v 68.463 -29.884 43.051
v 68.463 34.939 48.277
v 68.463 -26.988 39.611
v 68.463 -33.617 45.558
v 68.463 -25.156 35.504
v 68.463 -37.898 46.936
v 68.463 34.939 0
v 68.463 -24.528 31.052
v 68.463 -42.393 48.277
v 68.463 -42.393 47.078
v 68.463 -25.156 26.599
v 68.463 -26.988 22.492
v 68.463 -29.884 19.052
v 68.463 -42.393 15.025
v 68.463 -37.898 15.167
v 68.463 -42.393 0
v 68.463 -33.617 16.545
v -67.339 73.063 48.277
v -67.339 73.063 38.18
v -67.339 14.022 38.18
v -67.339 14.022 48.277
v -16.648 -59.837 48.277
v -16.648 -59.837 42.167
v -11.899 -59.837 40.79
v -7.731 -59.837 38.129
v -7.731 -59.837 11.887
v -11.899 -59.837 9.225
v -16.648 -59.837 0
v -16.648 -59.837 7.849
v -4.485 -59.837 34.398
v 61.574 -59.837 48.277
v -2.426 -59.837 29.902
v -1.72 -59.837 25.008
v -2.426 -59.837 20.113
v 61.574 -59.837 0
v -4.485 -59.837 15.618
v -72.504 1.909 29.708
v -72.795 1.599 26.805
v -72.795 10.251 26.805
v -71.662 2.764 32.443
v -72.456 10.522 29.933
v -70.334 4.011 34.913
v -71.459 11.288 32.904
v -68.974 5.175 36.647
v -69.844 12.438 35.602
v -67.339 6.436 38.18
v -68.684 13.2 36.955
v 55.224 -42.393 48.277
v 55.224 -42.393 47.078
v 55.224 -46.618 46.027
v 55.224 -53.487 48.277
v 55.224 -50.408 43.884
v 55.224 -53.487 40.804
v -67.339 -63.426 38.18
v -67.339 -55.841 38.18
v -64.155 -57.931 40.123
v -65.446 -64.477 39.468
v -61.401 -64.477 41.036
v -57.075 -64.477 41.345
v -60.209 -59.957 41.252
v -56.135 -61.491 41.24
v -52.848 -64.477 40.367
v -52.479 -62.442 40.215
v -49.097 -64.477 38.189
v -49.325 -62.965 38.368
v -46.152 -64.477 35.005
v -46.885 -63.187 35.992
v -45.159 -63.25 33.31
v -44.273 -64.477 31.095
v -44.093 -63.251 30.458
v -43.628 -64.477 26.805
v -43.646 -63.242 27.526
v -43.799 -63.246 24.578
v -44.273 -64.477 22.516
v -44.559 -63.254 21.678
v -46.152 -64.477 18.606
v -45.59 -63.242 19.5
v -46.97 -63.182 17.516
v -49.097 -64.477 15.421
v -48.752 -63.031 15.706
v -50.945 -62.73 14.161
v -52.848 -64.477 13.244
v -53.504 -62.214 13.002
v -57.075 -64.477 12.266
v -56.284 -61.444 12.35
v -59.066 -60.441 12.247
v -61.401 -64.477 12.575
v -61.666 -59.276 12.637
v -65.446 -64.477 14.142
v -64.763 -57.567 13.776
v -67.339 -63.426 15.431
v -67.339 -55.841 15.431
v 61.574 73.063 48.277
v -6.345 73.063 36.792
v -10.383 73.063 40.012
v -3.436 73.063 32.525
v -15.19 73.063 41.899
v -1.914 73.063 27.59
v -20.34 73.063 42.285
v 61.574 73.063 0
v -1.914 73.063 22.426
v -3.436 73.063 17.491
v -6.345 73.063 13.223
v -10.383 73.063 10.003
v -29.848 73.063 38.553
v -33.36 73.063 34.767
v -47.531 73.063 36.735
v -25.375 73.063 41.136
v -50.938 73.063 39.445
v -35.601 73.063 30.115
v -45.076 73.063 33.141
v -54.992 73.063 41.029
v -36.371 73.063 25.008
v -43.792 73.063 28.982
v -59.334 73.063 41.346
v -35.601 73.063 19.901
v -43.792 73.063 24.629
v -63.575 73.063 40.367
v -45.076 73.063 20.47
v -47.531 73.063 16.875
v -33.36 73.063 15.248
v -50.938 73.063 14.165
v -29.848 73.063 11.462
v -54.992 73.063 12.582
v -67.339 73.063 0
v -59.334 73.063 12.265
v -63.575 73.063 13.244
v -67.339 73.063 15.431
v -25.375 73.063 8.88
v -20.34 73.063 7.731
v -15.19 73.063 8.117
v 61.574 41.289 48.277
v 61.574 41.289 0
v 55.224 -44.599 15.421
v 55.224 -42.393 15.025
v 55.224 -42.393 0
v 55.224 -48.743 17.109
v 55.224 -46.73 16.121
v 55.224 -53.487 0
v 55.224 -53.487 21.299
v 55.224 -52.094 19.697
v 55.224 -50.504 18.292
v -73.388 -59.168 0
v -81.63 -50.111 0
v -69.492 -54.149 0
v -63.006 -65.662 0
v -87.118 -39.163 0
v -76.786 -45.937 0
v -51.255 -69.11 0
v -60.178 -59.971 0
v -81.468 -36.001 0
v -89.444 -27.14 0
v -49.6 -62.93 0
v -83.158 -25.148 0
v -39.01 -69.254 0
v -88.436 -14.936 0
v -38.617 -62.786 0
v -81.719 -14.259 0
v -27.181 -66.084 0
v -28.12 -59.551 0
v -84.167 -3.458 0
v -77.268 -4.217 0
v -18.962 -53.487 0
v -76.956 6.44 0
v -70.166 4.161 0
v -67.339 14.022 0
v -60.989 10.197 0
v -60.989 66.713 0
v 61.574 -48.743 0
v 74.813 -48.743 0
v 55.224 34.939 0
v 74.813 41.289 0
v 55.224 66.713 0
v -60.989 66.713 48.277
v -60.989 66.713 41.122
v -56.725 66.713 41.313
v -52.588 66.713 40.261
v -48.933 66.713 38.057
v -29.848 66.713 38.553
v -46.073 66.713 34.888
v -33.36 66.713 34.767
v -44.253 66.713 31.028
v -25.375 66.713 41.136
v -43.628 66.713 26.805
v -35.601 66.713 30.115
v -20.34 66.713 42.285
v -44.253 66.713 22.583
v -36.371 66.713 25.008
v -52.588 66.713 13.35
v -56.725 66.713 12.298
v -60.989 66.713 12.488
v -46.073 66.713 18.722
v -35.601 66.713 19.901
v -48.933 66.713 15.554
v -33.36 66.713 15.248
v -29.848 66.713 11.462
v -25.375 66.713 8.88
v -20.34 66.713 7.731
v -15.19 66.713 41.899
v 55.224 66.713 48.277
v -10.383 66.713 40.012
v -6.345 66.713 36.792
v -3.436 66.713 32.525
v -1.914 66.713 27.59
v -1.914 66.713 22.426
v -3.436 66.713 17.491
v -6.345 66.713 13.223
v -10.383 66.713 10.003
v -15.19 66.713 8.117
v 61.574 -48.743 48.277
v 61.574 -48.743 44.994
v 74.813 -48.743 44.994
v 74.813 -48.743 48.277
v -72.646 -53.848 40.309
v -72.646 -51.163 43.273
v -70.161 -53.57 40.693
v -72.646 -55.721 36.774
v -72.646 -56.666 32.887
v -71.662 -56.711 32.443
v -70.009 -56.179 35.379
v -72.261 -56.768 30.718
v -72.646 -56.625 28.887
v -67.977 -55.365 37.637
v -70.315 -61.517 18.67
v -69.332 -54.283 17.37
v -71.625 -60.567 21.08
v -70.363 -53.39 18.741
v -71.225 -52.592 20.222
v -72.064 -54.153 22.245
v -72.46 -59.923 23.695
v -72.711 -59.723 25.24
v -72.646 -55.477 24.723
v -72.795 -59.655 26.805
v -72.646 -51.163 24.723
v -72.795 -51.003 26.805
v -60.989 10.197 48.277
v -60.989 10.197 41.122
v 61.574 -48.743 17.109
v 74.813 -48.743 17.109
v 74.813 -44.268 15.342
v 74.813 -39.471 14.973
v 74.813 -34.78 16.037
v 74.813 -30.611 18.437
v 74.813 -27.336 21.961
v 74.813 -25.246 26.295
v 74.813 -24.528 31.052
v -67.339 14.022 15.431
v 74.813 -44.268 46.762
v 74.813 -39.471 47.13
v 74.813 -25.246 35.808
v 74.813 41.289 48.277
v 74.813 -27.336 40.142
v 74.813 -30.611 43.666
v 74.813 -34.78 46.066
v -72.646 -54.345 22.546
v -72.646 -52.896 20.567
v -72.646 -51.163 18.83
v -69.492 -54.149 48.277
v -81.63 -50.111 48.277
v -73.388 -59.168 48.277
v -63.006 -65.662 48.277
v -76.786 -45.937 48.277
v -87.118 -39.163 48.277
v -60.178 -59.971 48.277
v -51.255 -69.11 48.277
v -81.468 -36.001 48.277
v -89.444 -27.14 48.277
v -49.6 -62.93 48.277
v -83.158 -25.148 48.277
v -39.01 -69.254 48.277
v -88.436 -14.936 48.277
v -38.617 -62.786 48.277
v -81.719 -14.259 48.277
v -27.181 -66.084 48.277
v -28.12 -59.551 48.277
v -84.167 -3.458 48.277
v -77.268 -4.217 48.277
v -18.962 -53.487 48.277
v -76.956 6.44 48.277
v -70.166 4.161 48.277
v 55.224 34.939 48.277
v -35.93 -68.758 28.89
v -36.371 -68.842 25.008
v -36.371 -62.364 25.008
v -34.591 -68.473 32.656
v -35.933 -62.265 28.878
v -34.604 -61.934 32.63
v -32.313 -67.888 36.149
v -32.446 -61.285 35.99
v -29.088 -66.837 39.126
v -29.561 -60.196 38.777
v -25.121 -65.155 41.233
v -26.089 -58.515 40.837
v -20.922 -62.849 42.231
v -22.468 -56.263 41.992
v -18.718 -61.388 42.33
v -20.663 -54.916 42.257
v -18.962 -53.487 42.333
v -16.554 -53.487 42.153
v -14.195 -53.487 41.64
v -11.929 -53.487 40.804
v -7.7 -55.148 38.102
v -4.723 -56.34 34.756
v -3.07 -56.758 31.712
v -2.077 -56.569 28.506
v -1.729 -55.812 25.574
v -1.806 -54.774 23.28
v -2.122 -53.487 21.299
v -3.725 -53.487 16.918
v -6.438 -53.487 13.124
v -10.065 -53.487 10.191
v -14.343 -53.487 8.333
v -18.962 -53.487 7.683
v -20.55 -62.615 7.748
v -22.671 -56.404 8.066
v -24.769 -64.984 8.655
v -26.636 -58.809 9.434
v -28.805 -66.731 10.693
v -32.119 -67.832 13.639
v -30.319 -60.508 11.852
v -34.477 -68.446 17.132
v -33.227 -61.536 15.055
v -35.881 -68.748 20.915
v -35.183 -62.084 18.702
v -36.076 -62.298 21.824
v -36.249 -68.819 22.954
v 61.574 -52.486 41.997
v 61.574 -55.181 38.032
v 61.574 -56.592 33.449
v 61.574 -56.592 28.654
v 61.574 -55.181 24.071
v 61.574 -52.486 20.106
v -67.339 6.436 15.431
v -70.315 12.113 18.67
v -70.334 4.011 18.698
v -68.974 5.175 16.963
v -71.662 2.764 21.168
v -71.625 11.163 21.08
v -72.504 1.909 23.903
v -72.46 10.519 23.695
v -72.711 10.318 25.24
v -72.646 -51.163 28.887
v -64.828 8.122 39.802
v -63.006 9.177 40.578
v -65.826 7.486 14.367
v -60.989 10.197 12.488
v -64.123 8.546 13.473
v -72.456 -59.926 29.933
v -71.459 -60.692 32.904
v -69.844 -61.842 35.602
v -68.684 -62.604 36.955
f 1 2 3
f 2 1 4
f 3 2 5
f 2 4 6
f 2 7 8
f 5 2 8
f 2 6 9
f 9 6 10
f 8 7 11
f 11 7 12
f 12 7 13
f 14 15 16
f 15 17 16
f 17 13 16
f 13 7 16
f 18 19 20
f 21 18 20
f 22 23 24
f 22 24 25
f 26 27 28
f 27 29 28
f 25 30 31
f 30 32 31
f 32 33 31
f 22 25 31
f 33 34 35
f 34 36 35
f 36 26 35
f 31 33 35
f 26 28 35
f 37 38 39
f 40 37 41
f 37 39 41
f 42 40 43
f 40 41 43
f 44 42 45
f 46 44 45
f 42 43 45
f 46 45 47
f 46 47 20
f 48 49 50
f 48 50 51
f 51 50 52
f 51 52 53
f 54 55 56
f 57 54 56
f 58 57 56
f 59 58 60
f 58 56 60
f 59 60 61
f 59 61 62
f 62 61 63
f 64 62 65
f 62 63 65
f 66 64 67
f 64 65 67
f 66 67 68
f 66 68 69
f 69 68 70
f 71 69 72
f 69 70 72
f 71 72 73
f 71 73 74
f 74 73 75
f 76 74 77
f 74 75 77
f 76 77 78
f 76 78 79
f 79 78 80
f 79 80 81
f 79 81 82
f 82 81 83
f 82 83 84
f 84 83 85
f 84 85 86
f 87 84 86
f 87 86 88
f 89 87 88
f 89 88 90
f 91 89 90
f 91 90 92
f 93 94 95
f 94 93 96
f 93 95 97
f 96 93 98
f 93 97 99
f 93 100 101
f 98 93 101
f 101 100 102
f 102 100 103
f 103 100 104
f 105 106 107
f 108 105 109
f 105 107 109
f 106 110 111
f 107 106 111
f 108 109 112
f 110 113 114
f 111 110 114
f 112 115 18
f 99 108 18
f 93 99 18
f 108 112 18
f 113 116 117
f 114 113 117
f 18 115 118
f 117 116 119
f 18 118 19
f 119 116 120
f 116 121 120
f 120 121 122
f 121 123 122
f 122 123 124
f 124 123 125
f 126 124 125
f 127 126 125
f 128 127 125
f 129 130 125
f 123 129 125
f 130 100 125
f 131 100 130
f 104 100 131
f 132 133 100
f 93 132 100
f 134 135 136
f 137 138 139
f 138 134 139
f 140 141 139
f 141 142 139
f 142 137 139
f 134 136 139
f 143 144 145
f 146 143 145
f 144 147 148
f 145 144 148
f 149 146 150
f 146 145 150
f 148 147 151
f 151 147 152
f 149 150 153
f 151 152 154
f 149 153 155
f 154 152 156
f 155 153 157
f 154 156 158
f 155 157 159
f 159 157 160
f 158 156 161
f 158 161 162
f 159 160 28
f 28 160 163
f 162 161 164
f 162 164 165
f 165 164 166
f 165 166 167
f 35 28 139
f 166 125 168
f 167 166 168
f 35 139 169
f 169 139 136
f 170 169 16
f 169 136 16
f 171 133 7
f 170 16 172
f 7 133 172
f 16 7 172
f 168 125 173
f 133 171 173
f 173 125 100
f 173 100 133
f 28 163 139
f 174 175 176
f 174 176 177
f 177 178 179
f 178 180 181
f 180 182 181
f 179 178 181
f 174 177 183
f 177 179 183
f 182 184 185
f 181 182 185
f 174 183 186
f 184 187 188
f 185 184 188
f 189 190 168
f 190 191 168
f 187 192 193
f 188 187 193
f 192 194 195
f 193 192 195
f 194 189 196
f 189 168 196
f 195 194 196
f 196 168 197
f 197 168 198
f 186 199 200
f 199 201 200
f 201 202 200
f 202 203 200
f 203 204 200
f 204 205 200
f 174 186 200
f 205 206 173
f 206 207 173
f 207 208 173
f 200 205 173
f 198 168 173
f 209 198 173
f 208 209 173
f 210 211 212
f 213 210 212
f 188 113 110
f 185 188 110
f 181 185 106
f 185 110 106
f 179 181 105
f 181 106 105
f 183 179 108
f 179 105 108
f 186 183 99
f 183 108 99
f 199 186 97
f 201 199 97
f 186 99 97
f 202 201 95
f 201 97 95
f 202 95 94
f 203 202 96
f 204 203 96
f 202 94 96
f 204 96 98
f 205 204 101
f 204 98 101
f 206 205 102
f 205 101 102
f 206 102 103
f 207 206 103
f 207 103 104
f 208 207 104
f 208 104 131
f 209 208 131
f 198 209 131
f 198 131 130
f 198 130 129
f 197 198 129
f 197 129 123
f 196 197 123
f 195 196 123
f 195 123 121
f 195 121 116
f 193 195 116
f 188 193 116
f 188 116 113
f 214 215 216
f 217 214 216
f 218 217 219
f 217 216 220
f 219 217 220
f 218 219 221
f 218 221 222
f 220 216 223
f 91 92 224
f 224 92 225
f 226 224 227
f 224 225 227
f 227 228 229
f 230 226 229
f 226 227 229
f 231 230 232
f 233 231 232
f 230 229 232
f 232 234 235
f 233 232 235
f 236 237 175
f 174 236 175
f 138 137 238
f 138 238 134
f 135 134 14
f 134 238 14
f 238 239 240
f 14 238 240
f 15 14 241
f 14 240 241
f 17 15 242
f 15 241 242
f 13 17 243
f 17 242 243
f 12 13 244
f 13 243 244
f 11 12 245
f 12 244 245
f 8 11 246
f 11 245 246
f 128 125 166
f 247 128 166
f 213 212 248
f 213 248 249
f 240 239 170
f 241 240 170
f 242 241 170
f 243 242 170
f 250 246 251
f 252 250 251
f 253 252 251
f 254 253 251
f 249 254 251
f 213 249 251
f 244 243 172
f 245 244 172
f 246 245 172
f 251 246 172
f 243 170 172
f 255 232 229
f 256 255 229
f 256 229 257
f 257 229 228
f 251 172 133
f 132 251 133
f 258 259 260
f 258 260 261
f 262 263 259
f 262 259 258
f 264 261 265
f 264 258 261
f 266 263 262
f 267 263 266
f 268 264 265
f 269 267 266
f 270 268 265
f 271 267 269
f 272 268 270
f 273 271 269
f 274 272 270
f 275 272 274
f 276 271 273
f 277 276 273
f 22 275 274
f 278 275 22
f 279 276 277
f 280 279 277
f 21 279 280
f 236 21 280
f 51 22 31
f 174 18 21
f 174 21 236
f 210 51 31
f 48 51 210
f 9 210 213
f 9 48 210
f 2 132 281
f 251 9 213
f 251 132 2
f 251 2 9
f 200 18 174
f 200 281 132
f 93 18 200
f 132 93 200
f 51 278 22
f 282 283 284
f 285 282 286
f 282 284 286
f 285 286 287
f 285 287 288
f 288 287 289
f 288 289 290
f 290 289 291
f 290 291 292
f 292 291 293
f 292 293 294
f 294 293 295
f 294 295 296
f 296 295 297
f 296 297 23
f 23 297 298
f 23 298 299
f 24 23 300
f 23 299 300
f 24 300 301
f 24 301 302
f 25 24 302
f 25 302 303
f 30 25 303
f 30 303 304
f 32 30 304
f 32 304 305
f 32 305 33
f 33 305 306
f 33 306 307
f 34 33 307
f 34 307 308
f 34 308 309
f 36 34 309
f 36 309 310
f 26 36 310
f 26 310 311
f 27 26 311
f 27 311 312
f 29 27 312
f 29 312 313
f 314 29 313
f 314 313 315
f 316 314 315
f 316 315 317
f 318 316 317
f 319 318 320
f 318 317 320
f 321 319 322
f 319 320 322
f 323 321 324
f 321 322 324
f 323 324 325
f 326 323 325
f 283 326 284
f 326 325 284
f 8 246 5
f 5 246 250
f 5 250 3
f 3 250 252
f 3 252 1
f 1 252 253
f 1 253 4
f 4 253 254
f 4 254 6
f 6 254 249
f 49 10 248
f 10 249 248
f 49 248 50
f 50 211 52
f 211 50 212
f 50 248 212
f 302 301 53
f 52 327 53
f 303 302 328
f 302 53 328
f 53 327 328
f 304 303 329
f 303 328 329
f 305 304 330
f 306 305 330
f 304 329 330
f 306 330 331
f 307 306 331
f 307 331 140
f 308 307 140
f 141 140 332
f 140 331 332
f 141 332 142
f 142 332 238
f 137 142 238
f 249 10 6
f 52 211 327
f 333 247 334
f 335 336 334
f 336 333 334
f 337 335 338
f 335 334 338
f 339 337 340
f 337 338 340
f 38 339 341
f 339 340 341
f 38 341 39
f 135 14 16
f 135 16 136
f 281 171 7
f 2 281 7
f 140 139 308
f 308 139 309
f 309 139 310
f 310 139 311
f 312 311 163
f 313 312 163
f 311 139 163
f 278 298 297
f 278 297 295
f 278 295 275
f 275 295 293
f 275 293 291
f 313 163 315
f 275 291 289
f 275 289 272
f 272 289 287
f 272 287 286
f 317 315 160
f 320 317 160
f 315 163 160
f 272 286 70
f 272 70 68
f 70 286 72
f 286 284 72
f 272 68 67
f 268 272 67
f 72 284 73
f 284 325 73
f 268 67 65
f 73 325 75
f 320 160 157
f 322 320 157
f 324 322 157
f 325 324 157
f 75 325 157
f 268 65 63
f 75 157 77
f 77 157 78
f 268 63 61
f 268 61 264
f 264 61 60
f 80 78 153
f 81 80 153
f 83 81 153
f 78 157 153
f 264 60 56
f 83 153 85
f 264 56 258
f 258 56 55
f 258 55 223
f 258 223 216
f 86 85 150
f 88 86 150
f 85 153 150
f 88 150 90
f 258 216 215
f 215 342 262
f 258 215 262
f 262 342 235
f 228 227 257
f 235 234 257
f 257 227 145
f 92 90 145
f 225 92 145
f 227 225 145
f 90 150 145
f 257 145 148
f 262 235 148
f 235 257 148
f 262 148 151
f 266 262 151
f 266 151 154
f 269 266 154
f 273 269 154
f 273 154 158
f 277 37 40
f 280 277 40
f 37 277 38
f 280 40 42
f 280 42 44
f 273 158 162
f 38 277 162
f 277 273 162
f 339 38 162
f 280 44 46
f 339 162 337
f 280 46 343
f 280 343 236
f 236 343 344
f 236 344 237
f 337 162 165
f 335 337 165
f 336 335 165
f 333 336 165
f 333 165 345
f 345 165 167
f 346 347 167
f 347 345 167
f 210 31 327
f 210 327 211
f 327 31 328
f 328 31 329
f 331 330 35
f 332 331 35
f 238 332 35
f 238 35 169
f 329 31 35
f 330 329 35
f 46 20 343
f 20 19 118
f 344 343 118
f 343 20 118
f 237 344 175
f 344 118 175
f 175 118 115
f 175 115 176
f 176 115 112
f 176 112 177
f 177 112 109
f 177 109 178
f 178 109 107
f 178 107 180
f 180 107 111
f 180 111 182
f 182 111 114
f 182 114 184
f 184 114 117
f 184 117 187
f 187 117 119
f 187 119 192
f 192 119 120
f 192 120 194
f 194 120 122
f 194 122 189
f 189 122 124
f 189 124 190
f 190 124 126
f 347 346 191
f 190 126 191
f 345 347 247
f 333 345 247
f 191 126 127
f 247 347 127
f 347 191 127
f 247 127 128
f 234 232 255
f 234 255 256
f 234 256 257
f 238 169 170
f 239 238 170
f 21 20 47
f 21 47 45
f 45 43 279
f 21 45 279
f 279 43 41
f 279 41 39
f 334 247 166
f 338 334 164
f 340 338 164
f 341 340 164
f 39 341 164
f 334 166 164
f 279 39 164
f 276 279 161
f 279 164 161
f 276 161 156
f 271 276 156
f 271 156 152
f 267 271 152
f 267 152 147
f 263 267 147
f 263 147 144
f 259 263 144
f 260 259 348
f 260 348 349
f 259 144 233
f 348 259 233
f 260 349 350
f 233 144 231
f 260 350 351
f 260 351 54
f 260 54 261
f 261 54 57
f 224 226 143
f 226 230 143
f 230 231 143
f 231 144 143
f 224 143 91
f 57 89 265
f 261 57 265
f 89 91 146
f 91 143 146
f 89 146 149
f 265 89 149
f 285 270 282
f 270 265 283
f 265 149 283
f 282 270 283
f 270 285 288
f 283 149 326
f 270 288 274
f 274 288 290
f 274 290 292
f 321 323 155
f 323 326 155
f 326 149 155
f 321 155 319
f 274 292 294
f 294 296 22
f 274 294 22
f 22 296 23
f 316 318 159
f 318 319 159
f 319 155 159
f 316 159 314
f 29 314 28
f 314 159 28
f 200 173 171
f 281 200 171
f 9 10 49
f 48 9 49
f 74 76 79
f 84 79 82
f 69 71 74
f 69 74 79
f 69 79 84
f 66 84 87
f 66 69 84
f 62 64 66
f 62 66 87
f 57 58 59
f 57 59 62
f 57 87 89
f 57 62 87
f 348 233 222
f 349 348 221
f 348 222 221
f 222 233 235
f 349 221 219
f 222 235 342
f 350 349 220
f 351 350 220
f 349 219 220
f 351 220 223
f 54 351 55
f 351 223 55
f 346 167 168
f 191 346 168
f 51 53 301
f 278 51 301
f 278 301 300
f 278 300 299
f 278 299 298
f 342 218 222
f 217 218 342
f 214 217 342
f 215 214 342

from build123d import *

# Parameters (mm, degrees)
F1_DEPTH = 48.2772234827
F2_R     = 17.3254122278
F3_DEPTH = 178.0532356352
F6_DEPTH = 147.4594417959
F8_DEPTH = 137.5391036272


with BuildPart() as f1:
    # F0 (on Top) → F1 (new body)
    with BuildSketch(Plane.XY):
        with BuildLine():
            Line((61.5742132068, 73.062568903), (-67.3387721181, 73.062568903))
            Line((-67.3387721181, 73.062568903), (-67.3387721181, 14.0218225376))
            ThreePointArc((-67.3387721181, 14.0218225376), (-81.6301408592, -50.1107967732), (-16.6482494662, -59.8365291953))
            Line((-16.6482494662, -59.8365291953), (61.5742132068, -59.8365291953))
            Line((61.5742132068, -59.8365291953), (61.5742132068, -48.7425401807))
            Line((61.5742132068, -48.7425401807), (74.8133137822, -48.7425401807))
            Line((74.8133137822, -48.7425401807), (74.8133137822, 41.2890613079))
            Line((74.8133137822, 41.2890613079), (61.5742132068, 41.2890613079))
            Line((61.5742132068, 41.2890613079), (61.5742132068, 73.062568903))
        make_face()
        with BuildLine():
            Line((-60.9887721181, 66.712568903), (55.2242132068, 66.712568903))
            Line((55.2242132068, 66.712568903), (55.2242132068, 34.9390613079))
            Line((55.2242132068, 34.9390613079), (68.4633137822, 34.9390613079))
            Line((68.4633137822, 34.9390613079), (68.4633137822, -42.3925401807))
            Line((68.4633137822, -42.3925401807), (55.2242132068, -42.3925401807))
            Line((55.2242132068, -42.3925401807), (55.2242132068, -53.4865291953))
            Line((55.2242132068, -53.4865291953), (-18.9623394024, -53.4865291953))
            ThreePointArc((-18.9623394024, -53.4865291953), (-76.785621878, -45.9365465001), (-60.9887721181, 10.1971668335))
            Line((-60.9887721181, 10.1971668335), (-60.9887721181, 66.712568903))
        make_face(mode=Mode.SUBTRACT)
    extrude(amount=F1_DEPTH)

    # F2 (on face) → F3 (cut)
    with BuildSketch(Plane(origin=(0, 73.062568903, 0), x_dir=(-1, 0, 0), z_dir=(0, 1, 0))):
        with Locations((19.0455075353, 25.0077471137)):
            Circle(F2_R)
    extrude(amount=-F3_DEPTH, mode=Mode.SUBTRACT)

    # F5 (on face) → F6 (cut)
    with BuildSketch(Plane.YZ.offset(74.8133137822)):
        with BuildLine():
            Line((-48.7425401807, 17.1086588609), (-48.7425401807, 44.9944263589))
            ThreePointArc((-48.7425401807, 44.9944263589), (-56.7710567622, 31.0515426099), (-48.7425401807, 17.1086588609))
        make_face()
        with BuildLine():
            ThreePointArc((-48.7425401807, 17.1086588609), (-32.6051243829, 17.0807615663), (-24.5283525081, 31.0515426099))
            ThreePointArc((-24.5283525081, 31.0515426099), (-32.6051243829, 45.0223236536), (-48.7425401807, 44.9944263589))
            Line((-48.7425401807, 44.9944263589), (-48.7425401807, 17.1086588609))
        make_face()
    extrude(amount=-F6_DEPTH, mode=Mode.SUBTRACT)

    # F7 (on face) → F8 (cut)
    with BuildSketch(Plane(origin=(0, 73.062568903, 0), x_dir=(-1, 0, 0), z_dir=(0, 1, 0))):
        with BuildLine():
            ThreePointArc((67.3387721181, 15.4306932509), (71.3607365337, 20.4974204611), (72.7954935712, 26.8053039908))
            ThreePointArc((72.7954935712, 26.8053039908), (71.3607365337, 33.1131875206), (67.3387721181, 38.1799147308))
            Line((67.3387721181, 38.1799147308), (67.3387721181, 15.4306932509))
        make_face()
        with BuildLine():
            Line((67.3387721181, 15.4306932509), (67.3387721181, 38.1799147308))
            ThreePointArc((67.3387721181, 38.1799147308), (43.6282399612, 26.8053039908), (67.3387721181, 15.4306932509))
        make_face()
    extrude(amount=-F8_DEPTH, mode=Mode.SUBTRACT)


solid = f1.part
